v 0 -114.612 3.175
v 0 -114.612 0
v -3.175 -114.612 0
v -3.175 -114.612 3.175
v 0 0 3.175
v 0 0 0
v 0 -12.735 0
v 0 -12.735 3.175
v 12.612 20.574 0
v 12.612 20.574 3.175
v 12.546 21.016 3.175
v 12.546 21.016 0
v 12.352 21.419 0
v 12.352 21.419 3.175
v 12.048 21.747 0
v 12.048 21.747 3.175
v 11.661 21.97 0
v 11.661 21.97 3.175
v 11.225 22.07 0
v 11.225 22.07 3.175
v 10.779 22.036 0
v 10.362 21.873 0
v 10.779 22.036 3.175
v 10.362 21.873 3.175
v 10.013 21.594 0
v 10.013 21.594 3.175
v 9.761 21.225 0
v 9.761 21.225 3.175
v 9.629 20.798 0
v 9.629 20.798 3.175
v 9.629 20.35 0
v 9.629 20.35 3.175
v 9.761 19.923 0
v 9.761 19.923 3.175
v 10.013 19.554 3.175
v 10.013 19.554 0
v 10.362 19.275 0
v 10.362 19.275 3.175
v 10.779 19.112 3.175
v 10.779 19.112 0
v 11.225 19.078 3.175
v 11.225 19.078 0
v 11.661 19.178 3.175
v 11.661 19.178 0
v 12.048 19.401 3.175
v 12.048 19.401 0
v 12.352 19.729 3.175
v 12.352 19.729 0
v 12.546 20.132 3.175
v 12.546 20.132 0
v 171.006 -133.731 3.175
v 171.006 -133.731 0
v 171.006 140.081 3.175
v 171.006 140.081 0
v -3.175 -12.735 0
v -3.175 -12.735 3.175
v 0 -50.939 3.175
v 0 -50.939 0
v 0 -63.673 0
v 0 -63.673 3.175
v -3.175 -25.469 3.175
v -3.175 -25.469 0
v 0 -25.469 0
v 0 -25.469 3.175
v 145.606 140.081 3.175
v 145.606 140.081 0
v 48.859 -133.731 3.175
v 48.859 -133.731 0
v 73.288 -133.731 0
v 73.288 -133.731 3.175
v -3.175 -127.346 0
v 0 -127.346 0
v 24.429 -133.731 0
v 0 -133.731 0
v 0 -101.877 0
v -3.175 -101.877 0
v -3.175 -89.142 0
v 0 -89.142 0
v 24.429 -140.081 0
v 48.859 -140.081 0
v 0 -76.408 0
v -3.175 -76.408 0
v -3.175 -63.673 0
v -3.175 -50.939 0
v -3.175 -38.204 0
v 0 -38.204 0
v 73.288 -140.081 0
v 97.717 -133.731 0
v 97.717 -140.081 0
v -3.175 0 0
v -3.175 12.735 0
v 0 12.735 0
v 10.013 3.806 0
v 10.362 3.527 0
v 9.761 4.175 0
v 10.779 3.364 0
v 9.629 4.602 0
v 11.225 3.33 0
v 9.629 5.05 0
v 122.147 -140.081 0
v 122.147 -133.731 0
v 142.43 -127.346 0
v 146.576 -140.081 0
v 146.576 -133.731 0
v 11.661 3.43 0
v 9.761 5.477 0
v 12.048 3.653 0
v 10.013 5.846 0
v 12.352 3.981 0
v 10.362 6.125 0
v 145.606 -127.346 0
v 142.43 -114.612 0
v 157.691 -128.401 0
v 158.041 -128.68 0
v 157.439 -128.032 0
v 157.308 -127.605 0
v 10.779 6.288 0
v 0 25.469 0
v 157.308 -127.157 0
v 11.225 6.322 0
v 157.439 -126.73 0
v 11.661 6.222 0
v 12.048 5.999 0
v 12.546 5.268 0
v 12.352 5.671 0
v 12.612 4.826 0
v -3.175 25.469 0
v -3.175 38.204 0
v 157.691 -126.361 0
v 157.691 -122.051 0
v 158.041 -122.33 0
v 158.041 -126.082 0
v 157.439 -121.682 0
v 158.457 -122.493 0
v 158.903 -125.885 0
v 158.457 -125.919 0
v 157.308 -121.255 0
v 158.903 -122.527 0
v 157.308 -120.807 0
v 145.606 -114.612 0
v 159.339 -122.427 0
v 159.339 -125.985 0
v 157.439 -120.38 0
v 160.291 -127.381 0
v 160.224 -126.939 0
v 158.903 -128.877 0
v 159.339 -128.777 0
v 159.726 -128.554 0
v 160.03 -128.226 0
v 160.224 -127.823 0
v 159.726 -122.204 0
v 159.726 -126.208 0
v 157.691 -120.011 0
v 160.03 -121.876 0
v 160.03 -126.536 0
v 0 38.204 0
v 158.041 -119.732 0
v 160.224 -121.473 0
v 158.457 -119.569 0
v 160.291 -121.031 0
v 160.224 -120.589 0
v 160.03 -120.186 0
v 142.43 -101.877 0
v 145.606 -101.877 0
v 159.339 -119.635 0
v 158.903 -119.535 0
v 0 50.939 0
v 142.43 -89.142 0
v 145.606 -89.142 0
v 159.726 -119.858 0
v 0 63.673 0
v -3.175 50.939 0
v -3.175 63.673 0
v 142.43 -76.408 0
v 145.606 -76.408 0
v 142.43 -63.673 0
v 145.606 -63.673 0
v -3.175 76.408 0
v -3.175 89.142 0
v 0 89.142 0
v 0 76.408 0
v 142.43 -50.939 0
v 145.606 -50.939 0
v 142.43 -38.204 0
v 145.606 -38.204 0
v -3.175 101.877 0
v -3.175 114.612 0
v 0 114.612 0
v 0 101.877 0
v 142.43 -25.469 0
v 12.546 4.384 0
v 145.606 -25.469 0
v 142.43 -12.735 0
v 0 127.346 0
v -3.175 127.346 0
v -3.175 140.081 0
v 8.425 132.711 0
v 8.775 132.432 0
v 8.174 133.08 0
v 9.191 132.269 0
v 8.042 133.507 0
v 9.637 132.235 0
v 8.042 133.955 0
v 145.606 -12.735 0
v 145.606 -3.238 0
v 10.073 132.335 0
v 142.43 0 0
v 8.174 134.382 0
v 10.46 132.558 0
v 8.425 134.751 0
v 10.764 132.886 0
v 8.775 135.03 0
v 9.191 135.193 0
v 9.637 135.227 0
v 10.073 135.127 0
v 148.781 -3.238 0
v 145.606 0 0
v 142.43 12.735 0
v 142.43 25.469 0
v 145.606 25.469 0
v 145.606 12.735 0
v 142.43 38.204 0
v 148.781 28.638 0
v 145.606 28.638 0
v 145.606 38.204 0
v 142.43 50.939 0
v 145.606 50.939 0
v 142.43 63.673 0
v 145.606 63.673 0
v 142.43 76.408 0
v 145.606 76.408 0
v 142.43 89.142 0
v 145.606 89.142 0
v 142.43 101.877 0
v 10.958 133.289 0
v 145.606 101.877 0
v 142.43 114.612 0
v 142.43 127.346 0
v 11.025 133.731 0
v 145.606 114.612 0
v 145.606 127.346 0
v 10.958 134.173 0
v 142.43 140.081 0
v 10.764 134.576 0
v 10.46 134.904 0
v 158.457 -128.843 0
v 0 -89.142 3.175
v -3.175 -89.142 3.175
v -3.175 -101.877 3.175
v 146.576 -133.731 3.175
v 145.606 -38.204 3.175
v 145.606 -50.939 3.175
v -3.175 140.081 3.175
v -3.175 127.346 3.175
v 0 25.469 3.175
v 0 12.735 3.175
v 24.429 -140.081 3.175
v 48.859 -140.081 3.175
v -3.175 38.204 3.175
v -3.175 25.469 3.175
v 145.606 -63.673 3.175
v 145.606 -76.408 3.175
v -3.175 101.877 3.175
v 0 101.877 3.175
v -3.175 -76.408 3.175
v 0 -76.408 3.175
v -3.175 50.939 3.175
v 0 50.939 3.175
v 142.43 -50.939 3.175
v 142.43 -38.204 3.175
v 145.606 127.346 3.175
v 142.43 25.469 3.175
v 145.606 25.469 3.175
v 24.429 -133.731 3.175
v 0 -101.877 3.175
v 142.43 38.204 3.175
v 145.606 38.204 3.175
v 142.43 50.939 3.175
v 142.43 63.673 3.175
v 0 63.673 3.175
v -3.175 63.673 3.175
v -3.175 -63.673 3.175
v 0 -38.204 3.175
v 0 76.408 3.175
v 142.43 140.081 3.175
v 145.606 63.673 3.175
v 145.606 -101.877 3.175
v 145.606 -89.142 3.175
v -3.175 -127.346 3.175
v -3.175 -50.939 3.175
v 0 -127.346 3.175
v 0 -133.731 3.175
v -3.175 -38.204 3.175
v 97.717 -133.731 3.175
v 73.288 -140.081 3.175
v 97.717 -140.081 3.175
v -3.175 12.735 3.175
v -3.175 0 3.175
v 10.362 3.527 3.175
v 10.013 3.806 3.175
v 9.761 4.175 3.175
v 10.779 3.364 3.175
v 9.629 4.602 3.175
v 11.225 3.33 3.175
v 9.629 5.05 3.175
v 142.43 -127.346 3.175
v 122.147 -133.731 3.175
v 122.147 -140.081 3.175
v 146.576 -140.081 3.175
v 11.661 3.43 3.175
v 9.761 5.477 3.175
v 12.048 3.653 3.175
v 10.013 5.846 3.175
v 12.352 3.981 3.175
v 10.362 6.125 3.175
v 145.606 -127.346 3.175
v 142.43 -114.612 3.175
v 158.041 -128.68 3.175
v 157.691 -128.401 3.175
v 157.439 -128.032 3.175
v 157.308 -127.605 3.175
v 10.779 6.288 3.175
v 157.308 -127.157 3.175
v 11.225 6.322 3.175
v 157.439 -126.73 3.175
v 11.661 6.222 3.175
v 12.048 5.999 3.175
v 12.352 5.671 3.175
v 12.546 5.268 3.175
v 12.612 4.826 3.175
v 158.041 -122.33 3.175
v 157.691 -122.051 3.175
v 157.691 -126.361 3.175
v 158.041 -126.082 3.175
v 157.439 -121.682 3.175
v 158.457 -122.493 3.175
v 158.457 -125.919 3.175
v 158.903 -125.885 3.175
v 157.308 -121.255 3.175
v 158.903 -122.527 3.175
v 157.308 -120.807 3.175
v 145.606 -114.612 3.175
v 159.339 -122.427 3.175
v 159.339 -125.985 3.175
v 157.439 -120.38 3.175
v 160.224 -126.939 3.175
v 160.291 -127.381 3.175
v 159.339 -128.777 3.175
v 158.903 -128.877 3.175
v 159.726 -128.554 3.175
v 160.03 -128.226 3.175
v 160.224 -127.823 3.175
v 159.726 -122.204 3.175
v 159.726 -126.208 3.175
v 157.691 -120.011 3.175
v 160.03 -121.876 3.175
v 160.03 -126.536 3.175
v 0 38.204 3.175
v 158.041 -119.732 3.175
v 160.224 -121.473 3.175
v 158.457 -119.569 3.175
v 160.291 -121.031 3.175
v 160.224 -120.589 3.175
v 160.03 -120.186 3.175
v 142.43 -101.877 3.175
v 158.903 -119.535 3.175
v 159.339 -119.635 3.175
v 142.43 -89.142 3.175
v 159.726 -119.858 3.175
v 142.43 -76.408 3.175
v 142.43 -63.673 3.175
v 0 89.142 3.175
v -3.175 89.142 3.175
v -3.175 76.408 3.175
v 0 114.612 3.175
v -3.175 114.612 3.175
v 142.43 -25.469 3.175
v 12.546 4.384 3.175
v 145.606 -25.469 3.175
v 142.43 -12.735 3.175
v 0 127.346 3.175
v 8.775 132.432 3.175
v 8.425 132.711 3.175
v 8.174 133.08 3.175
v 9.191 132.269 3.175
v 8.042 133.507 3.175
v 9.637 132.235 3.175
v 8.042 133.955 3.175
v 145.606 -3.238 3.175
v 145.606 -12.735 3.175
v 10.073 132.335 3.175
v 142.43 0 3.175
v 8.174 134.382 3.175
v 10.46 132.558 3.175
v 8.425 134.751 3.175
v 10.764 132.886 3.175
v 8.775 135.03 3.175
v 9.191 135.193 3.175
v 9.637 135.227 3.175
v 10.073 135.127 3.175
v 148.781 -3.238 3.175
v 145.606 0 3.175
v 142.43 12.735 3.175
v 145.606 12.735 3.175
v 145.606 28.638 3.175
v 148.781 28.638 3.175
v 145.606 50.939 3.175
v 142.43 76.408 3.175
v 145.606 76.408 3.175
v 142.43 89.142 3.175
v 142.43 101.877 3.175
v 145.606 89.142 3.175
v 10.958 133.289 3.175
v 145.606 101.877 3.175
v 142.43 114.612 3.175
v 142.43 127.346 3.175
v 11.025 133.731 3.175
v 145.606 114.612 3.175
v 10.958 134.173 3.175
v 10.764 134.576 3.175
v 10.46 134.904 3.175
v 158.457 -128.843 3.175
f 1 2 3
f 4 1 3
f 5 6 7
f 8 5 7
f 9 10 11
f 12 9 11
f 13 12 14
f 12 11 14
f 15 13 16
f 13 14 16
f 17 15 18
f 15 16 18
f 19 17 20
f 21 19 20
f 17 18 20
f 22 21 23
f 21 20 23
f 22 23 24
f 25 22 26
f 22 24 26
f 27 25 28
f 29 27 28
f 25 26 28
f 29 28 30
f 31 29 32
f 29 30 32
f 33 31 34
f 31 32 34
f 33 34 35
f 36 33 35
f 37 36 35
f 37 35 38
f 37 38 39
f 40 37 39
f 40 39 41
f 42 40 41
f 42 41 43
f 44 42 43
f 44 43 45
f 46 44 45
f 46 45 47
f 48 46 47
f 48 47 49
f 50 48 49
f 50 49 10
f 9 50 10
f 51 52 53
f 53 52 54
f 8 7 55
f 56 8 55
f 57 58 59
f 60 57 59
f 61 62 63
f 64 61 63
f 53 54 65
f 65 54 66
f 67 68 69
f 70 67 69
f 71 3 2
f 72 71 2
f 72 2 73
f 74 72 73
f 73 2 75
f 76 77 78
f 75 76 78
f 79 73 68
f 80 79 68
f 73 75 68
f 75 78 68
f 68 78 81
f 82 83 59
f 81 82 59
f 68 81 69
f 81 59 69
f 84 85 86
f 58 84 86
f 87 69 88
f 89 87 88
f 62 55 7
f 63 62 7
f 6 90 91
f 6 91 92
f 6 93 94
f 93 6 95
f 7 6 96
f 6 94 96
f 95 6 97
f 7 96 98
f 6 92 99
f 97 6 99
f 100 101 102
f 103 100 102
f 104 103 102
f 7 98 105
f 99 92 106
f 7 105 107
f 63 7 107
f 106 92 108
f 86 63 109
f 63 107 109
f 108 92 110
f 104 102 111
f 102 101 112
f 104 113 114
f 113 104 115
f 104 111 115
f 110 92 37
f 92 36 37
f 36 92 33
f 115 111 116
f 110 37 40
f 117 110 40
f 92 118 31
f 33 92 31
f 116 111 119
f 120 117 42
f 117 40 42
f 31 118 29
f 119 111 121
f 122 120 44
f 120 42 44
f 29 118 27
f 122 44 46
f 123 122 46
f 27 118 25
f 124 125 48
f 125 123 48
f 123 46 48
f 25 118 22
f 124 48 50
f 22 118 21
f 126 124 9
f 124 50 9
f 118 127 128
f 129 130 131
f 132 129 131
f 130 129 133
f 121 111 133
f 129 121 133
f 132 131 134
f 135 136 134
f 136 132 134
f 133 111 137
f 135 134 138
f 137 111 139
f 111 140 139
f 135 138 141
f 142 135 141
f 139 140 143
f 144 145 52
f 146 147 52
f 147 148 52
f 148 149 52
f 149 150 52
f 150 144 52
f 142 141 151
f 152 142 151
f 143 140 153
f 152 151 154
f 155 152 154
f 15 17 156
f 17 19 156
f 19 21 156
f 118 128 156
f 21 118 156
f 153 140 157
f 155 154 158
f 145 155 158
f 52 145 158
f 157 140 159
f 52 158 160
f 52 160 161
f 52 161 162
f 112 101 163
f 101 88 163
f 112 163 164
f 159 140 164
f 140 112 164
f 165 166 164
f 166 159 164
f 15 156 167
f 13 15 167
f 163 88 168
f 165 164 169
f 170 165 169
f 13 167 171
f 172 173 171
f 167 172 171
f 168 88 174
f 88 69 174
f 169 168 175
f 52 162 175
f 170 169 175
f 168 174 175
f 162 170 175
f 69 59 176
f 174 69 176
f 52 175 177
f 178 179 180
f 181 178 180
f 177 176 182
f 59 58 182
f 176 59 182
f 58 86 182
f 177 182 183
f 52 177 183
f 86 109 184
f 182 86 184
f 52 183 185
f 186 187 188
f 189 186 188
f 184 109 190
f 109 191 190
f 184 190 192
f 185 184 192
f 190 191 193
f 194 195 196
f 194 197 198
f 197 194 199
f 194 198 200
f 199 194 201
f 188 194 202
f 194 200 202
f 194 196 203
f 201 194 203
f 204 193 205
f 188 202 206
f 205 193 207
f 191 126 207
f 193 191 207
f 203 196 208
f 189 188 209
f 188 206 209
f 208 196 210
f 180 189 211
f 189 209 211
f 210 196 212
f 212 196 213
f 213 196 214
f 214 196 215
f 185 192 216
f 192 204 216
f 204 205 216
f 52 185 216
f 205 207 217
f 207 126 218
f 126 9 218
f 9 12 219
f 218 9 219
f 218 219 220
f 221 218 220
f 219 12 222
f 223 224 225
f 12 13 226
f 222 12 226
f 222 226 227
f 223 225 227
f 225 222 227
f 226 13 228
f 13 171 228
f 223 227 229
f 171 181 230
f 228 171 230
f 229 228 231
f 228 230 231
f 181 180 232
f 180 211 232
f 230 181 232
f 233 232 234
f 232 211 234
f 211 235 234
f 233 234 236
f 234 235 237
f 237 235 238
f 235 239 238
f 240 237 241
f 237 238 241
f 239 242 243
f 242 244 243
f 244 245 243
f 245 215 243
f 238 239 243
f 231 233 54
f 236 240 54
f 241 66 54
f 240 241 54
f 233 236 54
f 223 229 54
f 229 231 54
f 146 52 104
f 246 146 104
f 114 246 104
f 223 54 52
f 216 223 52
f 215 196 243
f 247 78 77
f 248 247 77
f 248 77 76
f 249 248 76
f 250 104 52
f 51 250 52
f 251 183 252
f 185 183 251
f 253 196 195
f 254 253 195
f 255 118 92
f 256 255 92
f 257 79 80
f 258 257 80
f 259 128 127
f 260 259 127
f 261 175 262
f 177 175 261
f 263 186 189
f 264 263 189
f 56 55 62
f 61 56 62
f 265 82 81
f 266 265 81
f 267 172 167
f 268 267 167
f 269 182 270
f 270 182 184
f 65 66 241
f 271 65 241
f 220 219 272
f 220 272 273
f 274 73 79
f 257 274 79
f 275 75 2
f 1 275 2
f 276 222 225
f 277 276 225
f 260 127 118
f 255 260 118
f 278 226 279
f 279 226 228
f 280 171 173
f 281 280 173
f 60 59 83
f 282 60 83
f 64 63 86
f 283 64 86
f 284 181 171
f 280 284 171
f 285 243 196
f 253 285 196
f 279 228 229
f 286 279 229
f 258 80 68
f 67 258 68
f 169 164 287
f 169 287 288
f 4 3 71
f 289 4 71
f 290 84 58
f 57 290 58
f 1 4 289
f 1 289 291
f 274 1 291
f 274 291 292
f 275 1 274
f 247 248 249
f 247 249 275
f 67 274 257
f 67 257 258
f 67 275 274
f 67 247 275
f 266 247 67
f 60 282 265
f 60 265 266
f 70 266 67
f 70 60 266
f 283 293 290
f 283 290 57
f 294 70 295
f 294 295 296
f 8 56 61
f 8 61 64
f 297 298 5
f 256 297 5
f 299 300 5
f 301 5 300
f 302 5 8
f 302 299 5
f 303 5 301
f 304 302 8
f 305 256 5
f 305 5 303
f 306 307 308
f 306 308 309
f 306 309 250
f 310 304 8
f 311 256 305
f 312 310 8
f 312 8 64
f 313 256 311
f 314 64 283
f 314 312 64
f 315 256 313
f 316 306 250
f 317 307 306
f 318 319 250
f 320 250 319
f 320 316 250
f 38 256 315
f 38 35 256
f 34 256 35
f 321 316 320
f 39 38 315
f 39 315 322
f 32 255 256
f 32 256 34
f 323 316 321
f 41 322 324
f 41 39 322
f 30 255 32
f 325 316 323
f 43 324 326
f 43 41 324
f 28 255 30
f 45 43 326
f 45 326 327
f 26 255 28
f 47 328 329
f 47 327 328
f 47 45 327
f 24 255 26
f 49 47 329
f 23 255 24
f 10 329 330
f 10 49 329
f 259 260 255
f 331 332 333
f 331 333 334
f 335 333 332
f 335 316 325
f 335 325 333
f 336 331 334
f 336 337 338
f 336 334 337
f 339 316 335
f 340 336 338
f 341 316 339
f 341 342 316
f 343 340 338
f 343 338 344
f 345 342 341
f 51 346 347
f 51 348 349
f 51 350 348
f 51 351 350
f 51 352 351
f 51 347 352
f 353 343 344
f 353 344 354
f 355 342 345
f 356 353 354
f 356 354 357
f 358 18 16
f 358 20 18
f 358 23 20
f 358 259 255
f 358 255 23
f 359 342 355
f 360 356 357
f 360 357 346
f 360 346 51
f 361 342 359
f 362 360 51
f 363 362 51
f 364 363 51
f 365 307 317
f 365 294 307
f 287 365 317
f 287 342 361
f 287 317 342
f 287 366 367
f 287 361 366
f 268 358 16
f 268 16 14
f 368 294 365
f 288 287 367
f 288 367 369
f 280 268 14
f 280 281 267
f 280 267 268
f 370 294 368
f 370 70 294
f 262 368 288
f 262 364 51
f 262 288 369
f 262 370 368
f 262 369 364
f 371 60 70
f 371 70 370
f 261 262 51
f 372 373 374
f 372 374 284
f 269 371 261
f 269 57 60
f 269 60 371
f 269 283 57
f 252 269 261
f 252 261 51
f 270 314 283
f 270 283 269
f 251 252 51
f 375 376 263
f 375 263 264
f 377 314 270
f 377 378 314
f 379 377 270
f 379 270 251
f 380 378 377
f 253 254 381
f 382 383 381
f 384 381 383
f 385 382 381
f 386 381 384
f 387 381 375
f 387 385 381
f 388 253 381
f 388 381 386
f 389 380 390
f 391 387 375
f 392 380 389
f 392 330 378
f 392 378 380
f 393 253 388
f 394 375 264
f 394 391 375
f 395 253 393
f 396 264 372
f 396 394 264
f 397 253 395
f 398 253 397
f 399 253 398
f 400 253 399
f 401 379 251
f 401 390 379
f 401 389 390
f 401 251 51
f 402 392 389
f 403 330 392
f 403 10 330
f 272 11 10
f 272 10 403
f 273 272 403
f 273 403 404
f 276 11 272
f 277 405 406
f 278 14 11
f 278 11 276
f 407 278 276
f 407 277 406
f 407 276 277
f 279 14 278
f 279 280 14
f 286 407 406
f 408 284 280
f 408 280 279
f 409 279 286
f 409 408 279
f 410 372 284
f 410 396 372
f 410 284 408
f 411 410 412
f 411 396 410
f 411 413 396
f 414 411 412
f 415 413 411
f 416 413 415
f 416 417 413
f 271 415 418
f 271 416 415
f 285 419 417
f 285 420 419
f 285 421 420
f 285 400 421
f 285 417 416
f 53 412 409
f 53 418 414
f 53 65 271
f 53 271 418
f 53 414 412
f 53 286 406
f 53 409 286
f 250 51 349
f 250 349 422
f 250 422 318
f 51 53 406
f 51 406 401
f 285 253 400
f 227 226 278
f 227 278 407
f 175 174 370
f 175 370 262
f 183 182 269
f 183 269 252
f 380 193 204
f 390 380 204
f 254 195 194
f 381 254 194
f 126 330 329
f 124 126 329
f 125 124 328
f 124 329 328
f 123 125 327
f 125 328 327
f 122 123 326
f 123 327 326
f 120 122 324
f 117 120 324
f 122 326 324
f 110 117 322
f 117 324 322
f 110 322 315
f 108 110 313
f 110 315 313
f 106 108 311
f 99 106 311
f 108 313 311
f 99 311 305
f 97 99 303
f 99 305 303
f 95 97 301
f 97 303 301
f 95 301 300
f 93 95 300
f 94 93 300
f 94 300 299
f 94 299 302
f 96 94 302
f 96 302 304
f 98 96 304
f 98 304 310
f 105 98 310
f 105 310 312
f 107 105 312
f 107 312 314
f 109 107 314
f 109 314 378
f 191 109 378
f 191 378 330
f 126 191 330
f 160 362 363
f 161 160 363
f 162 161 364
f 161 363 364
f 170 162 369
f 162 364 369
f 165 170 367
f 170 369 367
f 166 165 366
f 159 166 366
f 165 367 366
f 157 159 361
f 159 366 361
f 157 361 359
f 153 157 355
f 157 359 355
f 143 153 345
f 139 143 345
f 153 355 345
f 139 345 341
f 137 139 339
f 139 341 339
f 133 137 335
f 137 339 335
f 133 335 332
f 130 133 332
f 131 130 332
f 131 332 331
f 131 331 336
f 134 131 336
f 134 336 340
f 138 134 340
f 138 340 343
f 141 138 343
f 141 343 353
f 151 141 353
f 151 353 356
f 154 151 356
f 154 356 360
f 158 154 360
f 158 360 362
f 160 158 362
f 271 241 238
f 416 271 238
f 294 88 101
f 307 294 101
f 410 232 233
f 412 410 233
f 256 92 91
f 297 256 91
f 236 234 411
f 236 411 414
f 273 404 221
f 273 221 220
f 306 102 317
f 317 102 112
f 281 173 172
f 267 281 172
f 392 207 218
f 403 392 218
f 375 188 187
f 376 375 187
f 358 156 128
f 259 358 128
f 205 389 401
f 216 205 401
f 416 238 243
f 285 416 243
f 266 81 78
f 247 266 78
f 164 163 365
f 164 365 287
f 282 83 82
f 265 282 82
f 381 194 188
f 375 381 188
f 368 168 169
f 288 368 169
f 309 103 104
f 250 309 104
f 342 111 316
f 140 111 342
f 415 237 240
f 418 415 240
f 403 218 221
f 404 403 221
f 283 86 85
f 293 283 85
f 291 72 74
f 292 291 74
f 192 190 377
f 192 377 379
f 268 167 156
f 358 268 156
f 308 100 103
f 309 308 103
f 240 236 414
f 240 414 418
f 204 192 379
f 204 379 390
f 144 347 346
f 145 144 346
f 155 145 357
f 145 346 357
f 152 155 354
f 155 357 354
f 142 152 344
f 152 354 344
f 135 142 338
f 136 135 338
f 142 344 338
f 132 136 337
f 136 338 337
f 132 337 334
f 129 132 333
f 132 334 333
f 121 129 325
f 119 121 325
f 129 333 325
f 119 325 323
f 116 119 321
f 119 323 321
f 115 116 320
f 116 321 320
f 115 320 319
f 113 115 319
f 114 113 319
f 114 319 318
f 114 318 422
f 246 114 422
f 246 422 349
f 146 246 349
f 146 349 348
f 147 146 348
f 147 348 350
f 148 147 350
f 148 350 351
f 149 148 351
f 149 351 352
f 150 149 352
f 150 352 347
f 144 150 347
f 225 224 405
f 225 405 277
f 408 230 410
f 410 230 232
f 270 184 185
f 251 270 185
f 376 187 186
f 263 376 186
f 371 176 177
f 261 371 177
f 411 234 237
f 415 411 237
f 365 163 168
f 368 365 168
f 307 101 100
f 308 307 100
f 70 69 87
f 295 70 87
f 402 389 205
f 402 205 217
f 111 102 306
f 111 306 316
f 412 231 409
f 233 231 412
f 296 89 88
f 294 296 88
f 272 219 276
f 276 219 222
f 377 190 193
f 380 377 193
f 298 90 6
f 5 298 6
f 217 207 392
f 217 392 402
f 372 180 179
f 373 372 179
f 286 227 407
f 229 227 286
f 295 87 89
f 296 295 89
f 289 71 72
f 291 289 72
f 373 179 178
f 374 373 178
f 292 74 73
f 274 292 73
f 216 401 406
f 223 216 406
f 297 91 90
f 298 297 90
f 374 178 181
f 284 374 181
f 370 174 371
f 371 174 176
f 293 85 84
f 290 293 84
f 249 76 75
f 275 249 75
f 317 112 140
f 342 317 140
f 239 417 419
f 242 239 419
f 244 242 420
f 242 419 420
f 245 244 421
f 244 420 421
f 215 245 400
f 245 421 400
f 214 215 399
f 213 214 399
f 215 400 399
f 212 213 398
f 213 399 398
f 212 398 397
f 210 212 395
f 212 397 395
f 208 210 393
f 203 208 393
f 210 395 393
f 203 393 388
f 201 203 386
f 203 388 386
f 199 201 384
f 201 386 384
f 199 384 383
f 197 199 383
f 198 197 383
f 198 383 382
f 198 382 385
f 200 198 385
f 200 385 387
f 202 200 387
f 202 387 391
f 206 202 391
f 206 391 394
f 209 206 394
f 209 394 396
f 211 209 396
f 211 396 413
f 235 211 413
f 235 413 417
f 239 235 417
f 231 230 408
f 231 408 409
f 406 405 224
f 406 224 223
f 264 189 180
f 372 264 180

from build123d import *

# Parameters (mm, degrees)
SKETCH1_W           = 3.175
SKETCH1_H           = 12.734636364
SKETCH1_H_2         = 12.734636363
BOSS_EXTRUDE1_DEPTH = 3.175
SKETCH2_R           = 1.5
SKETCH2_W           = 3.175
SKETCH2_H           = 31.877
CUT_EXTRUDE1_DEPTH  = 4.175


with BuildPart() as part:
    # Sketch1 → Boss-Extrude1 (new body)
    with BuildSketch(Plane.XY):
        Polygon((24.429357143, -133.731), (24.429357143, -140.081), (48.858714286, -140.081), (48.858714286, -133.731), (73.288071429, -133.731), (73.288071429, -140.081), (97.717428571, -140.081), (97.717428571, -133.731), (122.146785714, -133.731), (122.146785714, -140.081), (146.576142857, -140.081), (146.576142857, -133.731), (171.0055, -133.731), (171.0055, 140.081), (145.6055, 140.081), (145.6055, 127.346363636), (142.4305, 127.346363636), (142.4305, 140.081), (-3.175, 140.081), (-3.175, 127.346363636), (0, 127.346363636), (0, 114.611727273), (-3.175, 114.611727273), (-3.175, 101.877090909), (0, 101.877090909), (0, 89.142454545), (-3.175, 89.142454545), (-3.175, 76.407818182), (0, 76.407818182), (0, 63.673181818), (-3.175, 63.673181818), (-3.175, 50.938545455), (0, 50.938545455), (0, 38.203909091), (-3.175, 38.203909091), (-3.175, 25.469272727), (0, 25.469272727), (0, 12.734636364), (-3.175, 12.734636364), (-3.175, 0), (0, 0), (0, -12.734636364), (-3.175, -12.734636364), (-3.175, -25.469272727), (0, -25.469272727), (0, -38.203909091), (-3.175, -38.203909091), (-3.175, -50.938545455), (0, -50.938545455), (0, -63.673181818), (-3.175, -63.673181818), (-3.175, -76.407818182), (0, -76.407818182), (0, -89.142454545), (-3.175, -89.142454545), (-3.175, -101.877090909), (0, -101.877090909), (0, -114.611727273), (-3.175, -114.611727273), (-3.175, -127.346363636), (0, -127.346363636), (0, -133.731), align=None)
        with Locations((144.018, 108.244409091)):
            Rectangle(SKETCH1_W, SKETCH1_H, mode=Mode.SUBTRACT)
        with Locations((144.018, -120.979045455)):
            Rectangle(SKETCH1_W, SKETCH1_H_2, mode=Mode.SUBTRACT)
        with Locations((144.018, -95.509772727)):
            Rectangle(SKETCH1_W, SKETCH1_H, mode=Mode.SUBTRACT)
        with Locations((144.018, -70.0405)):
            Rectangle(SKETCH1_W, SKETCH1_H, mode=Mode.SUBTRACT)
        with Locations((144.018, -44.571227273)):
            Rectangle(SKETCH1_W, SKETCH1_H, mode=Mode.SUBTRACT)
        with Locations((144.018, -19.101954545)):
            Rectangle(SKETCH1_W, SKETCH1_H_2, mode=Mode.SUBTRACT)
        with Locations((144.018, 6.367318182)):
            Rectangle(SKETCH1_W, SKETCH1_H, mode=Mode.SUBTRACT)
        with Locations((144.018, 31.836590909)):
            Rectangle(SKETCH1_W, SKETCH1_H, mode=Mode.SUBTRACT)
        with Locations((144.018, 57.305863637)):
            Rectangle(SKETCH1_W, SKETCH1_H_2, mode=Mode.SUBTRACT)
        with Locations((144.018, 82.775136363)):
            Rectangle(SKETCH1_W, SKETCH1_H_2, mode=Mode.SUBTRACT)
    extrude(amount=BOSS_EXTRUDE1_DEPTH)

    # Sketch2 → Cut-Extrude1 (cut, through all)
    with BuildSketch(Plane.XY.offset(3.175)):
        with Locations((158.790821429, -121.031)):
            Circle(SKETCH2_R)
        with Locations((11.1125, 20.574)):
            Circle(SKETCH2_R)
        with Locations((11.1125, 4.826)):
            Circle(SKETCH2_R)
        with Locations((158.790821429, -127.381)):
            Circle(SKETCH2_R)
        with Locations((9.525, 133.731)):
            Circle(SKETCH2_R)
        with Locations((147.193, 12.7)):
            Rectangle(SKETCH2_W, SKETCH2_H)
    extrude(amount=-CUT_EXTRUDE1_DEPTH, mode=Mode.SUBTRACT)


solid = part.part
